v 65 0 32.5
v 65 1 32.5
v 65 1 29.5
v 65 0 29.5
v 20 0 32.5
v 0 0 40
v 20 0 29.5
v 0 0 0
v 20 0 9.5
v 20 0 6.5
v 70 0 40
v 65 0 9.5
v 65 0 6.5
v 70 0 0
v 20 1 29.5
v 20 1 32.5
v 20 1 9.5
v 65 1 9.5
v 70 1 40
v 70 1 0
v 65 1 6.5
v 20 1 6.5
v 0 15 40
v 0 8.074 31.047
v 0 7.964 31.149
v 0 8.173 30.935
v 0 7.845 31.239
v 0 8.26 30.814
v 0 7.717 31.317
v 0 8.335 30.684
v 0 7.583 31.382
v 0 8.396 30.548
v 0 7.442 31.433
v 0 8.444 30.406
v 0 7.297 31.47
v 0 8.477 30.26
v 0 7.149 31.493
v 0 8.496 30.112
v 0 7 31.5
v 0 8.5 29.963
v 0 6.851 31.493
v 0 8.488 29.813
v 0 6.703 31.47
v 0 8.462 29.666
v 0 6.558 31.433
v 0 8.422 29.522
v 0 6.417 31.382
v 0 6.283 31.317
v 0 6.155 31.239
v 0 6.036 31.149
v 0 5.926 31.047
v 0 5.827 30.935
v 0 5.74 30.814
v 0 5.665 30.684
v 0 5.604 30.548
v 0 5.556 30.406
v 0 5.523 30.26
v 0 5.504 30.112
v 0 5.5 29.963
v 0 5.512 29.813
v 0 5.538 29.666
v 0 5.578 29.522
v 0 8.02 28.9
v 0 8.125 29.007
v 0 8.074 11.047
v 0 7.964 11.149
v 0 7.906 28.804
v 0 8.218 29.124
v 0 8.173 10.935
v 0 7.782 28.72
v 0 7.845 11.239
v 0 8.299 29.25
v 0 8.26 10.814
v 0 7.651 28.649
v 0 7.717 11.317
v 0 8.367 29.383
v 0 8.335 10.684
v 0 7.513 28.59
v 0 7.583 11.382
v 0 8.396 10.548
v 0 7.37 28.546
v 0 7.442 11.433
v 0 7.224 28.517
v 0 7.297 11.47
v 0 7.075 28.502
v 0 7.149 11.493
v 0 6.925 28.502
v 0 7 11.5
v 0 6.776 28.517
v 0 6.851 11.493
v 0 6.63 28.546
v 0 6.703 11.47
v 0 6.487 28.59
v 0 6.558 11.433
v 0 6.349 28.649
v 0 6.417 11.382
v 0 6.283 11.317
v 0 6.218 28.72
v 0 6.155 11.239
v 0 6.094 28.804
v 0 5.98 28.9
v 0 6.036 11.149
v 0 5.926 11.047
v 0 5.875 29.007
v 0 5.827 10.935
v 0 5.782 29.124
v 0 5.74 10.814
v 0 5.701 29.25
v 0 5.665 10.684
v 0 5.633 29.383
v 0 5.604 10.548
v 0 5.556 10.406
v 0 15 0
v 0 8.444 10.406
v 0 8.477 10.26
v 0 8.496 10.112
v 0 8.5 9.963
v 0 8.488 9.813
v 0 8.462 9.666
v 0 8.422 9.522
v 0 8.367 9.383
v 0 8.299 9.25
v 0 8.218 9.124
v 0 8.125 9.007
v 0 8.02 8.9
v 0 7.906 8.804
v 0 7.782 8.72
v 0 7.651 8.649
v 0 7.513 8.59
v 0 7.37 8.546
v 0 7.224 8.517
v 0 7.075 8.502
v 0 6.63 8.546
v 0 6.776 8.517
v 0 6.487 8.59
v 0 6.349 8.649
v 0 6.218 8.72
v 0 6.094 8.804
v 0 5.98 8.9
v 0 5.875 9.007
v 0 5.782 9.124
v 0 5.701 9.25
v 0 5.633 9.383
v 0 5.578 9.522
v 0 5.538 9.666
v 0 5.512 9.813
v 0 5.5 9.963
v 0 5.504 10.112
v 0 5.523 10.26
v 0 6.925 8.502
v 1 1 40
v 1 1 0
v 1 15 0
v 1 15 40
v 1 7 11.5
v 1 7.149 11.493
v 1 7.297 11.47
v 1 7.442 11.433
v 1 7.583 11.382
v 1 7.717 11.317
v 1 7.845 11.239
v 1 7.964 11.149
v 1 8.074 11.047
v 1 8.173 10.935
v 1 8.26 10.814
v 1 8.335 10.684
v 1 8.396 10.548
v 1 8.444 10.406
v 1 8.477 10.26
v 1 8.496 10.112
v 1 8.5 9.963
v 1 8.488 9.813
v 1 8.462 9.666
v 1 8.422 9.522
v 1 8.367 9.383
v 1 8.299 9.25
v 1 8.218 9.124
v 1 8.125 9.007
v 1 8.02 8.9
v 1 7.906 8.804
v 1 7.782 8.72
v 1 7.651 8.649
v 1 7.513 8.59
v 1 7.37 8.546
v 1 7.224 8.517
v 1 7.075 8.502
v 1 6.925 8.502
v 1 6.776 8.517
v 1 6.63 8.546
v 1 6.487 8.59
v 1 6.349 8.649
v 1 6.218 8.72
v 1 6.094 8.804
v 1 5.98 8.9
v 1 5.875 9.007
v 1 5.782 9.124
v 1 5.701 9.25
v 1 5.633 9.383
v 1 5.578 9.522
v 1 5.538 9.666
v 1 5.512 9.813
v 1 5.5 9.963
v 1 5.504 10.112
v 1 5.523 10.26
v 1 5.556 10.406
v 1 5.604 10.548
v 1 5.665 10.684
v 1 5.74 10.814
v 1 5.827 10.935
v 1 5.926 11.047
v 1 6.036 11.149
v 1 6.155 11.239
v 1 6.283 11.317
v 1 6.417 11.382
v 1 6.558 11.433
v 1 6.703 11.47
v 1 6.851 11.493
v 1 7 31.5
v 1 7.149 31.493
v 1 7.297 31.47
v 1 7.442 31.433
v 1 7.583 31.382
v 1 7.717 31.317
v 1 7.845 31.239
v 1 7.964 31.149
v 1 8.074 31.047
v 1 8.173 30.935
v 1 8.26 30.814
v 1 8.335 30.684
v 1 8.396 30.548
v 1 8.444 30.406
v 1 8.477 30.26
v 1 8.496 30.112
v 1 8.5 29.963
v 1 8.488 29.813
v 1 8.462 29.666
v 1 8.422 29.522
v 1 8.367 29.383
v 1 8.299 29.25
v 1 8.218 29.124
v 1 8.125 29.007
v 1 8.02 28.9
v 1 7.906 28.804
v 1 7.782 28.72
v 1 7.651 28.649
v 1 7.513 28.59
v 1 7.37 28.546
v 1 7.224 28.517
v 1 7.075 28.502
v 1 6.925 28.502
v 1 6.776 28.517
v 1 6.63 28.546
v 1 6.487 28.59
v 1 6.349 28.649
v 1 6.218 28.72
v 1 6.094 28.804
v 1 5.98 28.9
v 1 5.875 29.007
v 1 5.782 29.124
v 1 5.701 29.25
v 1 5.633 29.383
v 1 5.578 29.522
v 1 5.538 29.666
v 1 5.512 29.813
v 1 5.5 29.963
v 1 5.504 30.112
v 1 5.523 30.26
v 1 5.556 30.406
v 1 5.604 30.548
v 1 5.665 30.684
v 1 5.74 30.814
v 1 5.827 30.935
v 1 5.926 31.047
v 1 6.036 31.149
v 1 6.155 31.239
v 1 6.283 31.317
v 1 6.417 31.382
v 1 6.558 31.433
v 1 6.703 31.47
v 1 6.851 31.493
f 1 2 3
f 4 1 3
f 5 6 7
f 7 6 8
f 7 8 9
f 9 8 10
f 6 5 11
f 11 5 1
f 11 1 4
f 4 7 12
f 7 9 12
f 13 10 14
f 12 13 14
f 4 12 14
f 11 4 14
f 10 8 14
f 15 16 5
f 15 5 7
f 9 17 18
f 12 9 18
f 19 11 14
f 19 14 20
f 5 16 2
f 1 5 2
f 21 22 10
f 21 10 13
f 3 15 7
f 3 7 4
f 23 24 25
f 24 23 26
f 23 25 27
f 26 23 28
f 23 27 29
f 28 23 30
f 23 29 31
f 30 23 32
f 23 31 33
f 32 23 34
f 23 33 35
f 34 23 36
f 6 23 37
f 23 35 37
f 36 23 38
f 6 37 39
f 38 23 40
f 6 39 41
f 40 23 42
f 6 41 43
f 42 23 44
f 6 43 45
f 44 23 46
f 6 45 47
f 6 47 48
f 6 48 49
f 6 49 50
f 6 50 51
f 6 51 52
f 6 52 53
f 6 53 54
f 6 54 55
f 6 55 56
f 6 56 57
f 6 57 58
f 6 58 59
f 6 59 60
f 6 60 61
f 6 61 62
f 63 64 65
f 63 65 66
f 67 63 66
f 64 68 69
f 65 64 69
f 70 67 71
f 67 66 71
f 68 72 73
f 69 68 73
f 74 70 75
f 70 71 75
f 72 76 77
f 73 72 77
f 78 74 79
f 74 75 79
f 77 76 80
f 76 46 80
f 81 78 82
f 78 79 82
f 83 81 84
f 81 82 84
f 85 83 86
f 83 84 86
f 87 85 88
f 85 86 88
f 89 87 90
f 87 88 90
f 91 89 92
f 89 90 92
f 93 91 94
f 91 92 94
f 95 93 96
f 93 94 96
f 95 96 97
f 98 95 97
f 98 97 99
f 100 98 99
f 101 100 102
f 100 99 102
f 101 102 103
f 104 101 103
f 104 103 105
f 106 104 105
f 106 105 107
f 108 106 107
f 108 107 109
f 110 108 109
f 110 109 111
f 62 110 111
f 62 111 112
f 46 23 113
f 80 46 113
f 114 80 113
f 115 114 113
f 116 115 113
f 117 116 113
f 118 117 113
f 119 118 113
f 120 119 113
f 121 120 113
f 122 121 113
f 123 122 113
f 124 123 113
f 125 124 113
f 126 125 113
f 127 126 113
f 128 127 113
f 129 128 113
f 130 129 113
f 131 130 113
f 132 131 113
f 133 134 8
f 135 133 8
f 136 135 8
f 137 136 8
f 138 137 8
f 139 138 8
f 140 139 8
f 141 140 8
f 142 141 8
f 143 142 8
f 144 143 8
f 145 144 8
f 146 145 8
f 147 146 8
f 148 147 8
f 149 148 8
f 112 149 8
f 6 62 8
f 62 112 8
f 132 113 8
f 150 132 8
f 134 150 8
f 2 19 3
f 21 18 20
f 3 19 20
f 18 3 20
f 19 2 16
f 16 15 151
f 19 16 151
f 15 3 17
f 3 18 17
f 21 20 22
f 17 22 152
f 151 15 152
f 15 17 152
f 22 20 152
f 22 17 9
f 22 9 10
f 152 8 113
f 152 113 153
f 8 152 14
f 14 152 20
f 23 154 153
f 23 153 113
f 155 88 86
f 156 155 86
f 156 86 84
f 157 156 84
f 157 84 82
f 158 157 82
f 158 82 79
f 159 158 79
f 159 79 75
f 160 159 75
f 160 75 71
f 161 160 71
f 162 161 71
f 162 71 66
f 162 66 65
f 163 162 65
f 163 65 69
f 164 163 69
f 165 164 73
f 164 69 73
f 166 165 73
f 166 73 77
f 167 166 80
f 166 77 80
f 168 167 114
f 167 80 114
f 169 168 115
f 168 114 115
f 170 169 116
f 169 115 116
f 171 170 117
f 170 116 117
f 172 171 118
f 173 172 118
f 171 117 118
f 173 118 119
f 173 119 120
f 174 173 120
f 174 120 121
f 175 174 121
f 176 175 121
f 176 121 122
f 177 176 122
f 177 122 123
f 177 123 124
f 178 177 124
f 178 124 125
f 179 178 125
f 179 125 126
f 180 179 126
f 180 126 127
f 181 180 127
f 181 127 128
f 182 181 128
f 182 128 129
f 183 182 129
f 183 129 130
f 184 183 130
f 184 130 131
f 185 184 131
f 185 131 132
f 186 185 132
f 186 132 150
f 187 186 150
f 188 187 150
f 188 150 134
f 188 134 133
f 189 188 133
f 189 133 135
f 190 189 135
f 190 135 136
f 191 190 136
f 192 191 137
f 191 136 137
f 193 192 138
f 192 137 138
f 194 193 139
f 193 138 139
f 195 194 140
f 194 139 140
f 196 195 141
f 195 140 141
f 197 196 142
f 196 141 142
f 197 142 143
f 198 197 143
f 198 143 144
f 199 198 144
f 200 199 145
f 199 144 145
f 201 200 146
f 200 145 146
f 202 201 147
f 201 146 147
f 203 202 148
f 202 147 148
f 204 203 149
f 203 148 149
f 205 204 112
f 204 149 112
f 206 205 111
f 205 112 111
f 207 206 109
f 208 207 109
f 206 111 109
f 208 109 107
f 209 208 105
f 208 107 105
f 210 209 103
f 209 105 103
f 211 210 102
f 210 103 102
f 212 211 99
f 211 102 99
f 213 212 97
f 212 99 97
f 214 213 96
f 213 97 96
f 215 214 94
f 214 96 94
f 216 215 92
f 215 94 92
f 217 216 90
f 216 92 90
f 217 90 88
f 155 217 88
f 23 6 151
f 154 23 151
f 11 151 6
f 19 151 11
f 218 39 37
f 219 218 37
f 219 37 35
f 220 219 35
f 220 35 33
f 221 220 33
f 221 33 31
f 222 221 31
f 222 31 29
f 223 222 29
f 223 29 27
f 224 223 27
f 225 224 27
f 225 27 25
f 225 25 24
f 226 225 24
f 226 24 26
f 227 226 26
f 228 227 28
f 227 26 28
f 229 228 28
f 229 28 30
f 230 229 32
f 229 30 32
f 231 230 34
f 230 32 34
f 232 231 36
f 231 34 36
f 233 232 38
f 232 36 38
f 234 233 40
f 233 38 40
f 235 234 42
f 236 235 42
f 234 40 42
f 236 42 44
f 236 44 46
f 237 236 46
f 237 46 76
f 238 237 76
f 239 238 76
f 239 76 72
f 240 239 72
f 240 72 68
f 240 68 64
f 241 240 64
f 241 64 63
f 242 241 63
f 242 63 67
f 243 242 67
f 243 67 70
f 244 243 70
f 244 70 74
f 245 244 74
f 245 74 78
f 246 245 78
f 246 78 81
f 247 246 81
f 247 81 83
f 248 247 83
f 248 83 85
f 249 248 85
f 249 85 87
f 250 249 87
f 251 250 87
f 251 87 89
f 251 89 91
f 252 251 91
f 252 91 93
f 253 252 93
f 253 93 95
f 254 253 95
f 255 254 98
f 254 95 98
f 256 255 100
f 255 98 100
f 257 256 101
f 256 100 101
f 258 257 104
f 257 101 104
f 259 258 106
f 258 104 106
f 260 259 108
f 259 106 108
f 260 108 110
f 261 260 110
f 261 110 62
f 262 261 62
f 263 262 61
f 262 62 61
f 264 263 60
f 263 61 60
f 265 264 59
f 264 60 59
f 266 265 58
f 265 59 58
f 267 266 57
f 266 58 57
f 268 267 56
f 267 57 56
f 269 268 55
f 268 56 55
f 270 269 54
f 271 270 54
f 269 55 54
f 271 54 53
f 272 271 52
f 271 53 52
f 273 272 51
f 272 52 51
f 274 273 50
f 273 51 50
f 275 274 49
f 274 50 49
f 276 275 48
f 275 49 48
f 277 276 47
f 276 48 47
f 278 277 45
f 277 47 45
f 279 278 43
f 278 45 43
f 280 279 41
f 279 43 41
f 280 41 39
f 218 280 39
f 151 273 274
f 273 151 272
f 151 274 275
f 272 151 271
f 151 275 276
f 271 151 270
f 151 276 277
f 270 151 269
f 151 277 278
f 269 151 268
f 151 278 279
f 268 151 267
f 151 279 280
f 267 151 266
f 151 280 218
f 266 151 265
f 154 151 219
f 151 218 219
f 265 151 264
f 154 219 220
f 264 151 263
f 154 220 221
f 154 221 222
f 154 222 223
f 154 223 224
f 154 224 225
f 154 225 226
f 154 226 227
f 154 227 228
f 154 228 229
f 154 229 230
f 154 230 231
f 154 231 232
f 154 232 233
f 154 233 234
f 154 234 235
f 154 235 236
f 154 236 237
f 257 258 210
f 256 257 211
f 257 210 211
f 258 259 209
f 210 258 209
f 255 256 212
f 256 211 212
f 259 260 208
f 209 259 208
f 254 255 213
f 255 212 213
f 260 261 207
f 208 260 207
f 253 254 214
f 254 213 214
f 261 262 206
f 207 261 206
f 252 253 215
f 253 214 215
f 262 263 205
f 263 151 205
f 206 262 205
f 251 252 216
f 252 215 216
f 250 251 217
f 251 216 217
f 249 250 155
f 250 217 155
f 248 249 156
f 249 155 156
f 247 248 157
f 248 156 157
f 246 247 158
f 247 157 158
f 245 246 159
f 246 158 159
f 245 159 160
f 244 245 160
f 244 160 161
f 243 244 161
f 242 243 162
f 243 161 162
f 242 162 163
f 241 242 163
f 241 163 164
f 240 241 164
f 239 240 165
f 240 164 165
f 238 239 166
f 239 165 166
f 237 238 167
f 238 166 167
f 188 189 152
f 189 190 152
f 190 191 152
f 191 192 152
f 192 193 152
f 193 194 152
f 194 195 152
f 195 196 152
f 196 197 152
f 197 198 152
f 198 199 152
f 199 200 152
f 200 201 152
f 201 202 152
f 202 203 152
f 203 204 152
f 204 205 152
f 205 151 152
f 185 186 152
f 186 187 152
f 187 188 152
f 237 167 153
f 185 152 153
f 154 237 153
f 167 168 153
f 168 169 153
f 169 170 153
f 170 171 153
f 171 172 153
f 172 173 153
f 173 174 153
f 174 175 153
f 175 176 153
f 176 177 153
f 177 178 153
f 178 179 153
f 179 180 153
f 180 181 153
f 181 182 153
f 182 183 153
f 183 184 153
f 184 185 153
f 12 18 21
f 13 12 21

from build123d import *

# Parameters (mm, degrees)
BOSS_EXTRUDE1_DEPTH = 40
SKETCH2_W           = 45
SKETCH2_H           = 3
CUT_EXTRUDE1_DEPTH  = 10
SKETCH3_R           = 1.5
CUT_EXTRUDE2_DEPTH  = 10


with BuildPart() as part:
    # Sketch1 → Boss-Extrude1 (new body)
    with BuildSketch(Plane.XY):
        Polygon((0, 0), (70, 0), (70, 1), (1, 1), (1, 15), (0, 15), align=None)
    extrude(amount=BOSS_EXTRUDE1_DEPTH)

    # Sketch2 → Cut-Extrude1 (cut)
    with BuildSketch(Plane(origin=(0, 1, 0), x_dir=(1, 0, 0), z_dir=(0, 1, 0))):
        with Locations((42.5, -8)):
            Rectangle(SKETCH2_W, SKETCH2_H)
        with Locations((42.5, -31)):
            Rectangle(SKETCH2_W, SKETCH2_H)
    extrude(amount=-CUT_EXTRUDE1_DEPTH, mode=Mode.SUBTRACT)

    # Sketch3 → Cut-Extrude2 (cut)
    with BuildSketch(Plane.ZY):
        with Locations((30, 7)):
            Circle(SKETCH3_R)
        with Locations((10, 7)):
            Circle(SKETCH3_R)
    extrude(amount=-CUT_EXTRUDE2_DEPTH, mode=Mode.SUBTRACT)


solid = part.part
